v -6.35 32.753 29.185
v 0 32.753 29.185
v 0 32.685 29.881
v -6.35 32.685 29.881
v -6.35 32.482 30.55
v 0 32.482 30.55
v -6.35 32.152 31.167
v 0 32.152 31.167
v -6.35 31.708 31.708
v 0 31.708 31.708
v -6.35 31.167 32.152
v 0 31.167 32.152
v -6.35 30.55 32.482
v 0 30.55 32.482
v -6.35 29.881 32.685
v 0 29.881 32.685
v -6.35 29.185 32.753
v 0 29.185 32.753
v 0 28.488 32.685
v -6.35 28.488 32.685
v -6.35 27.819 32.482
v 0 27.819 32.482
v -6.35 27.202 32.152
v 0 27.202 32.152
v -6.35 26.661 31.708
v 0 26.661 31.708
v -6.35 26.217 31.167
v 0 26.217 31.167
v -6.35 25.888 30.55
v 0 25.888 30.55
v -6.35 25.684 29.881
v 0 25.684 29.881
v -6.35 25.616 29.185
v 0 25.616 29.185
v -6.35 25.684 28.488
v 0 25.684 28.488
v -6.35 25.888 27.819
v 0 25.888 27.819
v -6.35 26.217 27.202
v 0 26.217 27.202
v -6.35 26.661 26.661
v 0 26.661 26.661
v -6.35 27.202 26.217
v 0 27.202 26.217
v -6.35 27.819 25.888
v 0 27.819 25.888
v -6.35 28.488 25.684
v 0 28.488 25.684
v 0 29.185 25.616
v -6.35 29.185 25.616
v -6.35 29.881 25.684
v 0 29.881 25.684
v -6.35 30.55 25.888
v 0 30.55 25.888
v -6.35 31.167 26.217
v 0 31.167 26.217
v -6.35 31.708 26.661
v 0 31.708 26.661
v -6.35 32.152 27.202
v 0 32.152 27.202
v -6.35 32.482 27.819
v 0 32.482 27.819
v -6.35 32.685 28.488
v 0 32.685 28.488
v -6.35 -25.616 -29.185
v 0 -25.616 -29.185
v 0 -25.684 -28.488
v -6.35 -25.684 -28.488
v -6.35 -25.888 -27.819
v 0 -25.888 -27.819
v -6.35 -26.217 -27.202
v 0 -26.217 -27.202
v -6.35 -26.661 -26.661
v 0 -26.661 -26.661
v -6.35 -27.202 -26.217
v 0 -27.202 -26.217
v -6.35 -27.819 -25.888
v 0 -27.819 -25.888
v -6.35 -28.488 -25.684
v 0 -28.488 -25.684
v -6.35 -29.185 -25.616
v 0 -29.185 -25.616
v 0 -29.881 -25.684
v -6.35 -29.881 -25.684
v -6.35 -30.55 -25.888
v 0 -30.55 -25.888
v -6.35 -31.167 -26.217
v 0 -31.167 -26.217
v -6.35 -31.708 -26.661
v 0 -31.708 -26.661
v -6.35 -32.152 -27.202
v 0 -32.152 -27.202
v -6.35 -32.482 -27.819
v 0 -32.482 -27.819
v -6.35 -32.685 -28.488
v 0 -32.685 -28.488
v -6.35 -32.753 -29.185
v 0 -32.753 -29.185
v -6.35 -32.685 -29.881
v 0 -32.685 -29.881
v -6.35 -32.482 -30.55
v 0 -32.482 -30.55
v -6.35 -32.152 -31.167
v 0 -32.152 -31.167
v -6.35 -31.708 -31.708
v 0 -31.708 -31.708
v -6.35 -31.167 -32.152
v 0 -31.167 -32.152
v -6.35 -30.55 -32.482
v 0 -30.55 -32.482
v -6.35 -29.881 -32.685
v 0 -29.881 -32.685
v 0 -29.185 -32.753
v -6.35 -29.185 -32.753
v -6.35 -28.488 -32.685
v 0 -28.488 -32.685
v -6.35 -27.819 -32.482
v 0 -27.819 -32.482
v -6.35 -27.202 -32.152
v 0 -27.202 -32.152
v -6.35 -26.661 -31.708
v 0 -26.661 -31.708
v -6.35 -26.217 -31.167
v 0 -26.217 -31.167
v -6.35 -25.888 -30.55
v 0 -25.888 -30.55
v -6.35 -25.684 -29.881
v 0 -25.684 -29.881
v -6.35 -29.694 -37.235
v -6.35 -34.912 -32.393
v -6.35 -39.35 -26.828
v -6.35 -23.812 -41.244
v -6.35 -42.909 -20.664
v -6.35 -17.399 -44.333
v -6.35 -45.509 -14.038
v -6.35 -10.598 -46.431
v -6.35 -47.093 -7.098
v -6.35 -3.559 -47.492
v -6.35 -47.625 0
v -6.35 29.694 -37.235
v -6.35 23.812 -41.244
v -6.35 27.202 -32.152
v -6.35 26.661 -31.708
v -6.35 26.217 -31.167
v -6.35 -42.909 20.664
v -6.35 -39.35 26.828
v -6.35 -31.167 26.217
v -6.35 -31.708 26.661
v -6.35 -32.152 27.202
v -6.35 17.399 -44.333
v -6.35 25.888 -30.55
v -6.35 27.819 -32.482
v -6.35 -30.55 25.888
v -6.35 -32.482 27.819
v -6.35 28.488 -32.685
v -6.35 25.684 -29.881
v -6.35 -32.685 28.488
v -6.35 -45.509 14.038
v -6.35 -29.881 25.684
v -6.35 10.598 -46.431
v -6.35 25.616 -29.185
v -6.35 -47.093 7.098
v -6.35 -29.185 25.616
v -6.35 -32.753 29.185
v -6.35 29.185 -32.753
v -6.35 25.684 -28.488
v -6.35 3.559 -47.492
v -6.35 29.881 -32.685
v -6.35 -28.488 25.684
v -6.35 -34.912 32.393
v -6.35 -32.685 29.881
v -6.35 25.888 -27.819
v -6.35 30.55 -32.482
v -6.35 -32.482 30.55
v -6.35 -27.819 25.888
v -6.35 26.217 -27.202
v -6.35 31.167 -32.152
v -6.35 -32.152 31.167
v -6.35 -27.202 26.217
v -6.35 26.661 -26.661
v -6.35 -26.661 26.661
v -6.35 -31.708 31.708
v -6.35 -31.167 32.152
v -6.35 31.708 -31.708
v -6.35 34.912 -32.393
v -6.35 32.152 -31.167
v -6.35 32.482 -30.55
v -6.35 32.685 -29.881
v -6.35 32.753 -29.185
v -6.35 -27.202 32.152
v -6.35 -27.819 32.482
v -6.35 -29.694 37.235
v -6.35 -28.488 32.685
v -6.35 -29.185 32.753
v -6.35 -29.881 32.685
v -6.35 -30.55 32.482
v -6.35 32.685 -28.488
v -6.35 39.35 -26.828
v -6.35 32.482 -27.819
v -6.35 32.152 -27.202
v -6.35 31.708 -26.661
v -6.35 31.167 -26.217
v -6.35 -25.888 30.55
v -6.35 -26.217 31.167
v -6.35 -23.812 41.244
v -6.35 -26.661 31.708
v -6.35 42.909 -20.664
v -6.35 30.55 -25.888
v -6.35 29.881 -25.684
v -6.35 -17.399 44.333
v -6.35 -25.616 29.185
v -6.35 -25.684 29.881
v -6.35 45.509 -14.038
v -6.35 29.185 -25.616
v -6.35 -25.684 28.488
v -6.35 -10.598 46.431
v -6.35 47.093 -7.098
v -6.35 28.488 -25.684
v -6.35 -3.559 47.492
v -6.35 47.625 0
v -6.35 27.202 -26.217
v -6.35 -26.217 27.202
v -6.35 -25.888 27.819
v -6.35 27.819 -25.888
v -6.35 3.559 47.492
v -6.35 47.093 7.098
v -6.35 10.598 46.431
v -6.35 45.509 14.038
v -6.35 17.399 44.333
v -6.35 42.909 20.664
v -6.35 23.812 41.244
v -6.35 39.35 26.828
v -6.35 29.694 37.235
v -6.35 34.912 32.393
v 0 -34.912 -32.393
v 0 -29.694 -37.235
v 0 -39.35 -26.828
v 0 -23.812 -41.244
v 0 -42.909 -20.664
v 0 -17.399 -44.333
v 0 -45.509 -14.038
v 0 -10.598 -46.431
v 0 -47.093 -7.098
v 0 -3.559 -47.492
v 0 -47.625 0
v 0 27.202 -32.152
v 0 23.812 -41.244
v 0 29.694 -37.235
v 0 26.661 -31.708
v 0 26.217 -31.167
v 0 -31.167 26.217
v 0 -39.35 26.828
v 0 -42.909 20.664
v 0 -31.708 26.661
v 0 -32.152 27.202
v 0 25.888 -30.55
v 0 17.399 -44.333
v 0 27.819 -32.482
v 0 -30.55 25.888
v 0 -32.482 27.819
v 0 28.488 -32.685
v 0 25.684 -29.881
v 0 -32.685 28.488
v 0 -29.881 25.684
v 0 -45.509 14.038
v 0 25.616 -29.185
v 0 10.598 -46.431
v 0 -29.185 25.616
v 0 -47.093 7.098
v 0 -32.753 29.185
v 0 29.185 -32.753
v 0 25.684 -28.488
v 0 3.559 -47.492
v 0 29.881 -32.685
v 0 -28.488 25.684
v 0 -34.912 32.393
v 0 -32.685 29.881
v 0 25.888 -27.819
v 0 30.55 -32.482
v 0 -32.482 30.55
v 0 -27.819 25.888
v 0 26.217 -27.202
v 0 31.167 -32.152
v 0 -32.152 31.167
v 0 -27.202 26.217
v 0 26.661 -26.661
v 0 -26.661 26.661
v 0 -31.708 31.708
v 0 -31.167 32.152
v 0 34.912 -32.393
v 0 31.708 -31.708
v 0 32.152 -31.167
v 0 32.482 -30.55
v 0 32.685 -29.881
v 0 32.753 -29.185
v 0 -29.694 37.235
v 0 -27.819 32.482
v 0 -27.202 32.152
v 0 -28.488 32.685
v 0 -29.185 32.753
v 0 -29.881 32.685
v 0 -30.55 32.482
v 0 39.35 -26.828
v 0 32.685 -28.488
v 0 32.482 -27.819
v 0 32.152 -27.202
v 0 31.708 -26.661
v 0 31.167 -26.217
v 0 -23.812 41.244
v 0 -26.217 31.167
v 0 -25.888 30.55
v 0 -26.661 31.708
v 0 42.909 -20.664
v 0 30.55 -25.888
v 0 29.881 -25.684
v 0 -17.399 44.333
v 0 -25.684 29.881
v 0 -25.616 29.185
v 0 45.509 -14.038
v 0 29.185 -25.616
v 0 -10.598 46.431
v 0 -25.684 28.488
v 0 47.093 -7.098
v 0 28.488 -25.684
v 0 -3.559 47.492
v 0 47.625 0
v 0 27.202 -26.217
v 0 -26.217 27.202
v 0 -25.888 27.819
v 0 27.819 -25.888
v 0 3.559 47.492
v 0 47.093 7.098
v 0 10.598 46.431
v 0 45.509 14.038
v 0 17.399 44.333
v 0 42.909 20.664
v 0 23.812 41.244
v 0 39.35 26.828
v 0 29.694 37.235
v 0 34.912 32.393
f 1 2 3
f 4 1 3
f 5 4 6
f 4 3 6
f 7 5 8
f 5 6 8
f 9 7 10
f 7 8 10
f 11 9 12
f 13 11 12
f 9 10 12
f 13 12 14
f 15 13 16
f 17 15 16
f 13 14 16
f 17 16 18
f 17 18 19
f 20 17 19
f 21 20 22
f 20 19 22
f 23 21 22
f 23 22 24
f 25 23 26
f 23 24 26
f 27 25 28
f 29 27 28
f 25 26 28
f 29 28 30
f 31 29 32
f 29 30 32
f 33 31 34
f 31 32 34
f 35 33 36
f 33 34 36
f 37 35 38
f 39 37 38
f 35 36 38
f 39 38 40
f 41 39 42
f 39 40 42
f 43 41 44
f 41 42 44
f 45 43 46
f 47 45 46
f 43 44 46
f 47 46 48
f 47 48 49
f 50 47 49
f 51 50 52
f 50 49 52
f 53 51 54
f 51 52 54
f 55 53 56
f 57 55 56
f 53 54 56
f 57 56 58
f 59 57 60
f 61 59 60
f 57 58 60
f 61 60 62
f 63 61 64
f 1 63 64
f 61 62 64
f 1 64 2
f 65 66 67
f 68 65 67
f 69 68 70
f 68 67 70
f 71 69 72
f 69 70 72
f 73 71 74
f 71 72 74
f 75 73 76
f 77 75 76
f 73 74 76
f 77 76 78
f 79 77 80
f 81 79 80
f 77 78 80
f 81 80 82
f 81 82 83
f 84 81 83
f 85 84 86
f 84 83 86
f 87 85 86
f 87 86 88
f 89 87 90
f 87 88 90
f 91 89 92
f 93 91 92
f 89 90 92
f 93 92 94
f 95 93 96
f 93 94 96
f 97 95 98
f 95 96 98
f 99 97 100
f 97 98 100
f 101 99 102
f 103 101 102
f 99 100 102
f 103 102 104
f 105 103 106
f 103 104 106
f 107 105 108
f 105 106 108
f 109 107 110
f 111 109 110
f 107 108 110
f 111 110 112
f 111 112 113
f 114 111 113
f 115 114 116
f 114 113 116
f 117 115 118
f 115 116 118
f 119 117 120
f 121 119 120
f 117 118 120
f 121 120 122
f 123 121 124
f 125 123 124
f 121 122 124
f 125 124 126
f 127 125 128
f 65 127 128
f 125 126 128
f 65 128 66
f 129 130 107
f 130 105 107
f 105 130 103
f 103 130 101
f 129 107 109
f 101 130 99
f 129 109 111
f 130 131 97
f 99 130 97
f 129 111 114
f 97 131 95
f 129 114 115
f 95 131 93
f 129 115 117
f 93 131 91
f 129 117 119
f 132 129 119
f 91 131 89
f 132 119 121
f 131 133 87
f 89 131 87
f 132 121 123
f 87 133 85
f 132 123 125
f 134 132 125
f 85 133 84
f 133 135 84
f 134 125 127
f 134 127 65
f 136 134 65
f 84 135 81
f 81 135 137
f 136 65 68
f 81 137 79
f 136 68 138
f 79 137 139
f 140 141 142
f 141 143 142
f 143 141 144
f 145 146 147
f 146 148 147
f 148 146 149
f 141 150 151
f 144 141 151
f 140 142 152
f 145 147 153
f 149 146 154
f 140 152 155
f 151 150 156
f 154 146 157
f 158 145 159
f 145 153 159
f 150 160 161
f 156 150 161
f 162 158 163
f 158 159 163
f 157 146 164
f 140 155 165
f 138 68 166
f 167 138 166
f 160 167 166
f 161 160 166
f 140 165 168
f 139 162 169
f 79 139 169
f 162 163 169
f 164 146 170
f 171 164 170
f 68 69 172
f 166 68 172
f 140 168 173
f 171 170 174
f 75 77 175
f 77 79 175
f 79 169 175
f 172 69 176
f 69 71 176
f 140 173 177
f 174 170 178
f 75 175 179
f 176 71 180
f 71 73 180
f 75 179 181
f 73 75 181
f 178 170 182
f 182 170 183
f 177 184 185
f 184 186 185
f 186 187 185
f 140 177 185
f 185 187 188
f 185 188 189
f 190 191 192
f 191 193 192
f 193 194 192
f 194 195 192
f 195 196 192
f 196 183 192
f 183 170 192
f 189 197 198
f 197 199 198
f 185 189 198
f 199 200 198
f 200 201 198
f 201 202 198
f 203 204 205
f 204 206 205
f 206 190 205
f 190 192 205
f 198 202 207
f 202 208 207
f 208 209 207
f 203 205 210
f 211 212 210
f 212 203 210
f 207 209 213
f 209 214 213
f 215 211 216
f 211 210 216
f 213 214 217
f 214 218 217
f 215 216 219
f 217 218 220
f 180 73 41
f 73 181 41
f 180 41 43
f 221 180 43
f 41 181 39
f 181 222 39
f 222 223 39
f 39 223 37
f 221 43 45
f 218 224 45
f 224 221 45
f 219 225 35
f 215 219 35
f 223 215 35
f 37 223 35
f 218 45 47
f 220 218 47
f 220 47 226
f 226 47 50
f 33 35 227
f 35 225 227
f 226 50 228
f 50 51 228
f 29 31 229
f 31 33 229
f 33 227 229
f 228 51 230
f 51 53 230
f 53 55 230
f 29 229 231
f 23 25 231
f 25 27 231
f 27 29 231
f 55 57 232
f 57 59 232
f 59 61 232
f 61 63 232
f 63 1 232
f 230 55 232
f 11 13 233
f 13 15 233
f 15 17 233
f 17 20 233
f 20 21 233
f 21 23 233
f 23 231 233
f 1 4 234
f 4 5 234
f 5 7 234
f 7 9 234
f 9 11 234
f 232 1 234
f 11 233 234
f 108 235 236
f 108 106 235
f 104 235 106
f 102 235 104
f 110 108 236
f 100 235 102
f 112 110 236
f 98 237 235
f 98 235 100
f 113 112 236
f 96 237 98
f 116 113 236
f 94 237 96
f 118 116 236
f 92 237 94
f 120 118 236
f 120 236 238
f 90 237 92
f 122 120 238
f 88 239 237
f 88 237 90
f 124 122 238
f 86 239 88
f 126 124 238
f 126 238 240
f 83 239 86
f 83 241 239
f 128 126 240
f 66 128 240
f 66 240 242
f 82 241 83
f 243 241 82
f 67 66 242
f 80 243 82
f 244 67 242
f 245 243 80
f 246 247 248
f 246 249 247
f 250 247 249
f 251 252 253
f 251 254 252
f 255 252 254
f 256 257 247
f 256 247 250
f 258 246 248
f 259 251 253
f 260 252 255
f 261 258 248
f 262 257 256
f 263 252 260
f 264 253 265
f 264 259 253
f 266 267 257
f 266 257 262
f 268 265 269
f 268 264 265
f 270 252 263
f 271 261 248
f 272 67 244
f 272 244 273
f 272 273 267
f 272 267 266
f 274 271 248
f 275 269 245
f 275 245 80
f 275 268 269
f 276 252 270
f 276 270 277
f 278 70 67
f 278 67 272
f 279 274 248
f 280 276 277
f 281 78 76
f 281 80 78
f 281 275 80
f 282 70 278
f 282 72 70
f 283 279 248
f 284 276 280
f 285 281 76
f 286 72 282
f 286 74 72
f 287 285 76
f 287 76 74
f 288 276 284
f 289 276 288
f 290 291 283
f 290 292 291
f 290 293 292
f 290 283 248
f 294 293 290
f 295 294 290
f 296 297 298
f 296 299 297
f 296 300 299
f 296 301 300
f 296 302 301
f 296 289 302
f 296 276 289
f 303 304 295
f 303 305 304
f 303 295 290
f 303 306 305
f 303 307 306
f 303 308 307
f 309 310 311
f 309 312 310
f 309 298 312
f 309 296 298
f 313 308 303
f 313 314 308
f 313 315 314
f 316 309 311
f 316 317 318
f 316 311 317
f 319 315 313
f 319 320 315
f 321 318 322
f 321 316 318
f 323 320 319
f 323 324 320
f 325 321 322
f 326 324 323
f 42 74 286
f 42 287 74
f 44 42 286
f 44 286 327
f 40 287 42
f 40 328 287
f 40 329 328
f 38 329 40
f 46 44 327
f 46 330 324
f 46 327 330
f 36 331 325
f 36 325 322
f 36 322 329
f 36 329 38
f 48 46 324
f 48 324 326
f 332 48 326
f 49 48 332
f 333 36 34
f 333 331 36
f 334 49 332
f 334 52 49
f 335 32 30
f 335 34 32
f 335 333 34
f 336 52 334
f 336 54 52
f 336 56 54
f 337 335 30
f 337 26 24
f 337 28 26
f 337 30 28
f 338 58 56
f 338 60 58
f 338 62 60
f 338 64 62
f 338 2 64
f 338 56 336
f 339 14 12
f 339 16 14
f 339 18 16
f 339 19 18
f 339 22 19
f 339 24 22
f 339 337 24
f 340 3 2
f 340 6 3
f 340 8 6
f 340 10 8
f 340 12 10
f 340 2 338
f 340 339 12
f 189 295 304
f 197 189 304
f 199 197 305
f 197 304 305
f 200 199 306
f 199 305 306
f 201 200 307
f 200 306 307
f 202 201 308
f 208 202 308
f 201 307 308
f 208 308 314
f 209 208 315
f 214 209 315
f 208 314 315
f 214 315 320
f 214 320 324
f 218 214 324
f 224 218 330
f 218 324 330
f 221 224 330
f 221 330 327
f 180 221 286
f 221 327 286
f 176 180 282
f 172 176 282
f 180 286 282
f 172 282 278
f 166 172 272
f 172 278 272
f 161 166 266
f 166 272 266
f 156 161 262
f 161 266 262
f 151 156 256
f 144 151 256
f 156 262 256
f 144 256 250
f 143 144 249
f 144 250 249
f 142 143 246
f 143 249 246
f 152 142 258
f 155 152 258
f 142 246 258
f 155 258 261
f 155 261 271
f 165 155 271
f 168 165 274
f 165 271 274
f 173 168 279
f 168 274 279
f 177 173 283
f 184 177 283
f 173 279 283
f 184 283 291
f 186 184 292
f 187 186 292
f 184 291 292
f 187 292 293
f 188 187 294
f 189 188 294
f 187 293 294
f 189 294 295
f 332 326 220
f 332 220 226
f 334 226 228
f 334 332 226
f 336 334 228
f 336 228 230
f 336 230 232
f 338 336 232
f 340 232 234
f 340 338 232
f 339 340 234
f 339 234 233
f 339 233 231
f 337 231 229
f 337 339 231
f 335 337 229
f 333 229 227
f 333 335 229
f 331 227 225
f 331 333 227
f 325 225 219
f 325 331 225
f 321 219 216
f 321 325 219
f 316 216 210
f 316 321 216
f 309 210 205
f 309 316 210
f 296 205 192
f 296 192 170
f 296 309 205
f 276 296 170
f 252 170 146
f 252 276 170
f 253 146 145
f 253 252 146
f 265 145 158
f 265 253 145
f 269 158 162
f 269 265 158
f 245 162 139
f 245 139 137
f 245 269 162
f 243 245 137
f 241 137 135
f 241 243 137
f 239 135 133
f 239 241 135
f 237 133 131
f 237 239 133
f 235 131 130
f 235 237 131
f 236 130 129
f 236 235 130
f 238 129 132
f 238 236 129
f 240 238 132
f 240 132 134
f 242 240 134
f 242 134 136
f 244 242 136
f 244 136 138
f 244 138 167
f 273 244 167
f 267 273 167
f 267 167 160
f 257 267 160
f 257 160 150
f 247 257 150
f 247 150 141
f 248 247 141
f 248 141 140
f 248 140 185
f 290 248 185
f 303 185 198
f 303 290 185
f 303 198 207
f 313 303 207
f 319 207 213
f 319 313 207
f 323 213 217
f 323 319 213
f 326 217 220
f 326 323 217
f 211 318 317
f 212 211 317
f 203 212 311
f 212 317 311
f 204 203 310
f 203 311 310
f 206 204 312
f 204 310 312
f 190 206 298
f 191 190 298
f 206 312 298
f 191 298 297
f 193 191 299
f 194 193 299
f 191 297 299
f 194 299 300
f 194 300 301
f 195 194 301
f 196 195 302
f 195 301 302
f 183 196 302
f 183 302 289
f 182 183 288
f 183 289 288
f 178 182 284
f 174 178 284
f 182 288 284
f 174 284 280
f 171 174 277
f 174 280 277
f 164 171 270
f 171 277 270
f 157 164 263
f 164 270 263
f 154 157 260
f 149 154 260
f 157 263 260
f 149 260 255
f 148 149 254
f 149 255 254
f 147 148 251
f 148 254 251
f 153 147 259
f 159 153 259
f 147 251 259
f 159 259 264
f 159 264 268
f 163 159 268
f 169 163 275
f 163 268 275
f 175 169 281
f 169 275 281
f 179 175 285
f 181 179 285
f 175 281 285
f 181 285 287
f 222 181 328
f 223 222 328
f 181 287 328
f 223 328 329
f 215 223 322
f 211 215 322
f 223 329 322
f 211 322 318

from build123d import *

# Parameters (mm, degrees)
F0_R     = 47.625
F0_R_2   = 3.5687
F1_DEPTH = 6.35


with BuildPart() as f1:
    # F0 (on Right) → F1 (new body)
    with BuildSketch(Plane.YZ):
        Circle(F0_R)
        with Locations((-29.1846, -29.1846)):
            Circle(F0_R_2, mode=Mode.SUBTRACT)
        with Locations((29.1846, -29.1846)):
            Circle(F0_R_2, mode=Mode.SUBTRACT)
        with Locations((-29.1846, 29.1846)):
            Circle(F0_R_2, mode=Mode.SUBTRACT)
        with Locations((29.1846, 29.1846)):
            Circle(F0_R_2, mode=Mode.SUBTRACT)
    extrude(amount=-F1_DEPTH)


solid = f1.part
